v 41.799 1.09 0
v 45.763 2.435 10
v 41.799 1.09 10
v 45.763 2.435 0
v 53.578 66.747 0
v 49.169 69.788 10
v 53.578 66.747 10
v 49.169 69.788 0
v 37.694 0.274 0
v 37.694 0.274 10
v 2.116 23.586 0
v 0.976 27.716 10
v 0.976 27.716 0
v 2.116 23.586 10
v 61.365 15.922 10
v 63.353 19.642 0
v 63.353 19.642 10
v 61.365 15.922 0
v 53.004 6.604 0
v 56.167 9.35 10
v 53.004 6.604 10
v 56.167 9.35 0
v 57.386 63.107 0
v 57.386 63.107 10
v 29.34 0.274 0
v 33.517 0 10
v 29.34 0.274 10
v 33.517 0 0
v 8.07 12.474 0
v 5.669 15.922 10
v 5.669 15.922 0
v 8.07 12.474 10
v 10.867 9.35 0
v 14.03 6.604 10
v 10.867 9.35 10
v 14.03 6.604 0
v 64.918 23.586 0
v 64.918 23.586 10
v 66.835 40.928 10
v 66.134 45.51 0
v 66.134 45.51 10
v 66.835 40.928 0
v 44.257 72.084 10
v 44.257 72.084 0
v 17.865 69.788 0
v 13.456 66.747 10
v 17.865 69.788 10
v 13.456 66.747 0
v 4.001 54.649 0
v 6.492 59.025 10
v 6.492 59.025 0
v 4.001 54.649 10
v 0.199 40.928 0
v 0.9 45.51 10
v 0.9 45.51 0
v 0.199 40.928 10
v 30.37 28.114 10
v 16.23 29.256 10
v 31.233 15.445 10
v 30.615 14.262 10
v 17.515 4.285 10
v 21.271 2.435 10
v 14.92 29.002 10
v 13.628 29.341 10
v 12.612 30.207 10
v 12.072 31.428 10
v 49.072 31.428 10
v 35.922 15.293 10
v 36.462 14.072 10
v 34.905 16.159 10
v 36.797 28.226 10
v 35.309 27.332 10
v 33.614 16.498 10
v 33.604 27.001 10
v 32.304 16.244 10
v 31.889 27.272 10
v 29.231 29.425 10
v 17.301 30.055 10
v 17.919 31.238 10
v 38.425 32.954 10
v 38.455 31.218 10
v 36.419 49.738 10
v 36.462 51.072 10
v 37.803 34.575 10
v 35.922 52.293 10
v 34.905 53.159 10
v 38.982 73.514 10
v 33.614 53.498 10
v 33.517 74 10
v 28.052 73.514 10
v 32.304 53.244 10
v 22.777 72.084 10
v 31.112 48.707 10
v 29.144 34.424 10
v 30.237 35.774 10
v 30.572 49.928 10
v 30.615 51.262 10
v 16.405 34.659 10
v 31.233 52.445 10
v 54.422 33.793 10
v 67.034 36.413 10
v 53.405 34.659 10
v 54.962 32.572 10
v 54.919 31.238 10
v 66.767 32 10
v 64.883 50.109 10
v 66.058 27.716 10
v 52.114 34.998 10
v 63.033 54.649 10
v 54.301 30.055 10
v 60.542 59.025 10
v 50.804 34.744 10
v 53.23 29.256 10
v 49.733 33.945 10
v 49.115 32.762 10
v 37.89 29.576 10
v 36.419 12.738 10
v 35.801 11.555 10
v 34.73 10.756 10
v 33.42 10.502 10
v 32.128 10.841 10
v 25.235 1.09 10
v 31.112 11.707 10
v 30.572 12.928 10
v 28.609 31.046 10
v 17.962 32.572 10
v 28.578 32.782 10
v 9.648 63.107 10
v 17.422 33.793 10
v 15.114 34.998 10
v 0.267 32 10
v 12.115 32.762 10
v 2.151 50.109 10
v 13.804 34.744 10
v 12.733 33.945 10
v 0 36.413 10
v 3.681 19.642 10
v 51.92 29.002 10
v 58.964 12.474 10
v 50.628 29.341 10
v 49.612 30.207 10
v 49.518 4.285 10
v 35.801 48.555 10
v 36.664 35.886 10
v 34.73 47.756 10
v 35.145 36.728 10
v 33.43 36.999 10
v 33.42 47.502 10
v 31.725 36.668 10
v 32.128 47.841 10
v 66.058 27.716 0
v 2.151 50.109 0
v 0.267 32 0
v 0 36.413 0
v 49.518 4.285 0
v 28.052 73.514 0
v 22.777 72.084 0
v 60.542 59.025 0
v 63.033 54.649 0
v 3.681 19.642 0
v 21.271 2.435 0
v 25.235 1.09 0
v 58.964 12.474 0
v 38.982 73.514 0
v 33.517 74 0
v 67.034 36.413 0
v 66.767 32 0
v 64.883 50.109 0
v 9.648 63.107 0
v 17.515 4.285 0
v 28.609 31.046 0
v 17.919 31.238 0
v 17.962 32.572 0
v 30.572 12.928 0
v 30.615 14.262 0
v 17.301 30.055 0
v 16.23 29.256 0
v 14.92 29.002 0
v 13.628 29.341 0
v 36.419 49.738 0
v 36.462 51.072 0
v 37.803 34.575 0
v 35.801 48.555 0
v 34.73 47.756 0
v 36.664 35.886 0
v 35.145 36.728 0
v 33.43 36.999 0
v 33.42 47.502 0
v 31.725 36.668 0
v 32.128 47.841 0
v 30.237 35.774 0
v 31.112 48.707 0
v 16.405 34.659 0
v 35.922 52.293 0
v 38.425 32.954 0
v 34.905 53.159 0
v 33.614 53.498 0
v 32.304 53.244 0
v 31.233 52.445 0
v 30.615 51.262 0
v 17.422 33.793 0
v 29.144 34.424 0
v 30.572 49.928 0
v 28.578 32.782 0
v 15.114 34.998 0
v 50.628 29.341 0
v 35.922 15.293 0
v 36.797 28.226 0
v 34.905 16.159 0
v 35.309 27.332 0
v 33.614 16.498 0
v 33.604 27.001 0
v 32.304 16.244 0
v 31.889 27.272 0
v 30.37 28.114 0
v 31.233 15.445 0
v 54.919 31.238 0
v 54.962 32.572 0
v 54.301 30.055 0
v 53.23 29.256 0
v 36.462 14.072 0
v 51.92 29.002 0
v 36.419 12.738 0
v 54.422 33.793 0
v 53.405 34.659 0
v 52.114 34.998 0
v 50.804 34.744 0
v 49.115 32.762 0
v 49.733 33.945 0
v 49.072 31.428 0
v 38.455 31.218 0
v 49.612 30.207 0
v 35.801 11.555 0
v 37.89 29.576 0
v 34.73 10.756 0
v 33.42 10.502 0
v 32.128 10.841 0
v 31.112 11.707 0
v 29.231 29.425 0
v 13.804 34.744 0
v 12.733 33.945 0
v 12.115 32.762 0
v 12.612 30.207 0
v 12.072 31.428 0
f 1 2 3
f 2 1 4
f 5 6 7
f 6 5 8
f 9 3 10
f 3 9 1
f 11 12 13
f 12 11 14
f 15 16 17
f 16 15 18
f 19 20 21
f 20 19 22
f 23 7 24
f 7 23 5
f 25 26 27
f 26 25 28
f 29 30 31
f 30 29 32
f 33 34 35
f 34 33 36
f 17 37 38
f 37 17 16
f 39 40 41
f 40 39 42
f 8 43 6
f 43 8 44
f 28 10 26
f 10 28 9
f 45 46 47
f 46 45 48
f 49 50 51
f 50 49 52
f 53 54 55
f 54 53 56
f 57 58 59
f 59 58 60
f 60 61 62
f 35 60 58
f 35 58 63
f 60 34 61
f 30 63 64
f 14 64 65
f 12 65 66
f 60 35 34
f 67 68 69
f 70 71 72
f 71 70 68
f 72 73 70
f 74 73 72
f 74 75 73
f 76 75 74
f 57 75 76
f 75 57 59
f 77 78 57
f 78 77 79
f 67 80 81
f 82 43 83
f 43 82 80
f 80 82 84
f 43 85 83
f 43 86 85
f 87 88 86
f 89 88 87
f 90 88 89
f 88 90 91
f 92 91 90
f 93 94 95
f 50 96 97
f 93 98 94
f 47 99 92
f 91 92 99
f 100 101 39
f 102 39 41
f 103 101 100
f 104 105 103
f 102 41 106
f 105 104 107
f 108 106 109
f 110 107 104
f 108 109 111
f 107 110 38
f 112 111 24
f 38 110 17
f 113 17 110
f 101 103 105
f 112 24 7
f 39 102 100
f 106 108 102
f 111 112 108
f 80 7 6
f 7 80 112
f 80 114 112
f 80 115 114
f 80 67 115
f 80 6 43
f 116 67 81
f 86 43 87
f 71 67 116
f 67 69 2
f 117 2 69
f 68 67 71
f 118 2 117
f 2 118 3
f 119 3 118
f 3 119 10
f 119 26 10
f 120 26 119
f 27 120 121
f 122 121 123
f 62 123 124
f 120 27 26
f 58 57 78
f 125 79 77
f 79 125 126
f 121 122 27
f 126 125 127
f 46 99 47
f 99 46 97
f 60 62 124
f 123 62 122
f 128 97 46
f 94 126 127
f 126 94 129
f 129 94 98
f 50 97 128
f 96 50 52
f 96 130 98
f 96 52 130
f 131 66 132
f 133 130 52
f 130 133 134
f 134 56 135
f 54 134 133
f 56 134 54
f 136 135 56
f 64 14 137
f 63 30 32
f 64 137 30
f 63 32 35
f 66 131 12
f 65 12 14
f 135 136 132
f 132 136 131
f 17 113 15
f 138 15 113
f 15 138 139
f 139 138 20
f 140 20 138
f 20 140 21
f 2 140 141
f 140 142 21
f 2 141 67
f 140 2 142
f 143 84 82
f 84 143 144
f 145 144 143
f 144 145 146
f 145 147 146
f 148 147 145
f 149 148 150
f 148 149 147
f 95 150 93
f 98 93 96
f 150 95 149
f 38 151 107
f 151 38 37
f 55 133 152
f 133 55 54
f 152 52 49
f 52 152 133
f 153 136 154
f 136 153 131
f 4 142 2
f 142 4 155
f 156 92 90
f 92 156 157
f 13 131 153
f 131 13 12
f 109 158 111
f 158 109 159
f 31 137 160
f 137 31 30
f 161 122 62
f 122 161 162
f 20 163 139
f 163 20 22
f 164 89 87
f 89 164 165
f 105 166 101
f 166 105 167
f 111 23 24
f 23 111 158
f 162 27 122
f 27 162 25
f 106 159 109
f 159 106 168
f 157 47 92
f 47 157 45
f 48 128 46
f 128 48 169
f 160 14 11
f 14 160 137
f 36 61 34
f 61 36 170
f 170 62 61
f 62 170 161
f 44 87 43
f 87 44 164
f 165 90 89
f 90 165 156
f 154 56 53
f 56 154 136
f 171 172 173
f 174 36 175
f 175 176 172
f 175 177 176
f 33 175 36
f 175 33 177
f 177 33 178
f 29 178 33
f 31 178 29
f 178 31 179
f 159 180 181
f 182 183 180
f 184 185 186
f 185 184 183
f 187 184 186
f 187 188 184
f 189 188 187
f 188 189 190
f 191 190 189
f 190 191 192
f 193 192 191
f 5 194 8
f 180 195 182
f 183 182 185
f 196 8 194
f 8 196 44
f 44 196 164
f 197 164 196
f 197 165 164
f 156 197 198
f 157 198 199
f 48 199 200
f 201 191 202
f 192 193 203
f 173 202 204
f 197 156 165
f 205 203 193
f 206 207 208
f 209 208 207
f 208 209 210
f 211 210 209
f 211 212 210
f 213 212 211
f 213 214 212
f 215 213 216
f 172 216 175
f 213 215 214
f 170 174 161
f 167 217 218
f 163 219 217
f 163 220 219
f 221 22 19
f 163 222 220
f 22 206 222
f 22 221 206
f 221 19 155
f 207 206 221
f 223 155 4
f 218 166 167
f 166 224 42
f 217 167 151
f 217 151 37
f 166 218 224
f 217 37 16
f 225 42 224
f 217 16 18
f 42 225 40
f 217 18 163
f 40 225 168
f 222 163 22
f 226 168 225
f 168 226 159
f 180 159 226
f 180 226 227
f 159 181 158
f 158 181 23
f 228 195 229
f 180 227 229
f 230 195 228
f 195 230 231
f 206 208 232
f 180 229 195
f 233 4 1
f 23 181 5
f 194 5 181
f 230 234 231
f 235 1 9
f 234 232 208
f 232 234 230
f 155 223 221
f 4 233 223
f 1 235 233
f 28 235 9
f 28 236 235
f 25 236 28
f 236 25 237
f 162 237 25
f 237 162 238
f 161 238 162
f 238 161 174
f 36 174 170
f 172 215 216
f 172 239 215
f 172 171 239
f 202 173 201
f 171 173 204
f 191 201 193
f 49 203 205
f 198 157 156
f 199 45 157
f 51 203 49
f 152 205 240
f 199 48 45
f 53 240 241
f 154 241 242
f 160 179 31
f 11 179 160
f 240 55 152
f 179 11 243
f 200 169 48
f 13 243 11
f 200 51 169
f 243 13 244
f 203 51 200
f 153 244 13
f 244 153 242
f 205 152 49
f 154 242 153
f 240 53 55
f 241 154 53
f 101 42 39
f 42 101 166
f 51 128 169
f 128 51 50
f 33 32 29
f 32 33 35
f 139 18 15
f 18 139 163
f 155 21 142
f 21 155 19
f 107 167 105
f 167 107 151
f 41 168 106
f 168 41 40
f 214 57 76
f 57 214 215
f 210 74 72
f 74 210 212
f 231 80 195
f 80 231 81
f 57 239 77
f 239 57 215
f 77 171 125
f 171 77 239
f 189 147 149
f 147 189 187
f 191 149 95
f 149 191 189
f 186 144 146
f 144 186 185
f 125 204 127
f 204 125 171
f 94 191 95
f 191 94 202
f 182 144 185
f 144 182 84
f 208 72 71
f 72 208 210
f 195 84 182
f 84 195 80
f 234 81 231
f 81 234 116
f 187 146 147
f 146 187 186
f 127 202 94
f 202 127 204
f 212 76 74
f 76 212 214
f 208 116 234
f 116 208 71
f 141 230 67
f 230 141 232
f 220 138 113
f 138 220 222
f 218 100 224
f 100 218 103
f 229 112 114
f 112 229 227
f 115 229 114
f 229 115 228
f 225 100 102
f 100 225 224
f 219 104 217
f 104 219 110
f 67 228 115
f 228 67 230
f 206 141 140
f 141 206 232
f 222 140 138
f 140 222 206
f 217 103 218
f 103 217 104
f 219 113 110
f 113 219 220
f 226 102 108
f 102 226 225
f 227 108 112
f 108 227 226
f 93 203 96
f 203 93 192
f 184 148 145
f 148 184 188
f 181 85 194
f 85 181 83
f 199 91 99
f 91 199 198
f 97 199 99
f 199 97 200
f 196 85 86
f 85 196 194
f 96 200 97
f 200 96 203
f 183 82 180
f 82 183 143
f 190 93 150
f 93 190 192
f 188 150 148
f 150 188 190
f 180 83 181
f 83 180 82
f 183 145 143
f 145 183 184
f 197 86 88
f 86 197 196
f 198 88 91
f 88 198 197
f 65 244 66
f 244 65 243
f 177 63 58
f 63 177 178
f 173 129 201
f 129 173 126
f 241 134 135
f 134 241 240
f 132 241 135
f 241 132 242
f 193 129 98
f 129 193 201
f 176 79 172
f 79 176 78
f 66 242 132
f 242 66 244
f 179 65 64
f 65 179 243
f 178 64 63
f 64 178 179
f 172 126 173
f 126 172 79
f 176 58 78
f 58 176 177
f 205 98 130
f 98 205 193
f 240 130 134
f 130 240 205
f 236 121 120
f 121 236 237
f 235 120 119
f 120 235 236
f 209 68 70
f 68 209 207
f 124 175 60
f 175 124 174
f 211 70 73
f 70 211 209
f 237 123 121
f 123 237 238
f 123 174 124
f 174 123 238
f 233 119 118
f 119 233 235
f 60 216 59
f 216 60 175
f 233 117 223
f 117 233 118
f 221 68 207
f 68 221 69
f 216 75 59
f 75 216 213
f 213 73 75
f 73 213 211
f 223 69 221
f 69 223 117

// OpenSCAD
$fn = 32;

// ----------------------------------------------------------------------
// Cam plate: single_lobe cam, base R32
// ----------------------------------------------------------------------

// --- parameters (mm) ---
base_r = 32;              // base circle radius
lobe_h = 10;              // cam lobe rise
bore_r = 5;               // shaft bore radius
plate_t = 10;             // plate thickness, Z (extrusion height)
ring_r = 18.5;            // lightening ring radius
bolt_r = 3;               // lightening hole radius
fit_tol = 0.1;            // declared fit tolerance (prompt contract)
free_tol = 0.5;           // declared free tolerance (prompt contract)

profile = [[66.767, 32], [67.034, 36.413], [66.835, 40.928], [66.134, 45.51], [64.883, 50.109], [63.033, 54.649], [60.542, 59.025], [57.386, 63.107], [53.578, 66.747], [49.169, 69.788], [44.257, 72.084], [38.982, 73.514], [33.517, 74], [28.052, 73.514], [22.777, 72.084], [17.865, 69.788], [13.456, 66.747], [9.648, 63.107], [6.492, 59.025], [4.001, 54.649], [2.151, 50.109], [0.9, 45.51], [0.199, 40.928], [0, 36.413], [0.267, 32], [0.976, 27.716], [2.116, 23.586], [3.681, 19.642], [5.669, 15.922], [8.07, 12.474], [10.867, 9.35], [14.03, 6.604], [17.515, 4.285], [21.271, 2.435], [25.235, 1.09], [29.34, 0.274], [33.517, 0], [37.694, 0.274], [41.799, 1.09], [45.763, 2.435], [49.518, 4.285], [53.004, 6.604], [56.167, 9.35], [58.964, 12.474], [61.365, 15.922], [63.353, 19.642], [64.918, 23.586], [66.058, 27.716]];  // primary outline, 48 points, counter clockwise
void_1 = [[38.425, 32.954], [37.803, 34.575], [36.664, 35.886], [35.145, 36.728], [33.43, 36.999], [31.725, 36.668], [30.237, 35.774], [29.144, 34.424], [28.578, 32.782], [28.609, 31.046], [29.231, 29.425], [30.37, 28.114], [31.889, 27.272], [33.604, 27.001], [35.309, 27.332], [36.797, 28.226], [37.89, 29.576], [38.455, 31.218]];  // shaft bore, 18 points
void_2 = [[54.962, 32.572], [54.422, 33.793], [53.405, 34.659], [52.114, 34.998], [50.804, 34.744], [49.733, 33.945], [49.115, 32.762], [49.072, 31.428], [49.612, 30.207], [50.628, 29.341], [51.92, 29.002], [53.23, 29.256], [54.301, 30.055], [54.919, 31.238]];  // lightening hole 1, 14 points
void_3 = [[36.462, 51.072], [35.922, 52.293], [34.905, 53.159], [33.614, 53.498], [32.304, 53.244], [31.233, 52.445], [30.615, 51.262], [30.572, 49.928], [31.112, 48.707], [32.128, 47.841], [33.42, 47.502], [34.73, 47.756], [35.801, 48.555], [36.419, 49.738]];  // lightening hole 2, 14 points
void_4 = [[17.962, 32.572], [17.422, 33.793], [16.405, 34.659], [15.114, 34.998], [13.804, 34.744], [12.733, 33.945], [12.115, 32.762], [12.072, 31.428], [12.612, 30.207], [13.628, 29.341], [14.92, 29.002], [16.23, 29.256], [17.301, 30.055], [17.919, 31.238]];  // lightening hole 3, 14 points
void_5 = [[36.462, 14.072], [35.922, 15.293], [34.905, 16.159], [33.614, 16.498], [32.304, 16.244], [31.233, 15.445], [30.615, 14.262], [30.572, 12.928], [31.112, 11.707], [32.128, 10.841], [33.42, 10.502], [34.73, 10.756], [35.801, 11.555], [36.419, 12.738]];  // lightening hole 4, 14 points

// --- the one profile operation ---
difference() {
  linear_extrude(height = plate_t) polygon(points = profile);
  translate([0, 0, -1])
    linear_extrude(height = plate_t + 2) polygon(points = void_1);
  translate([0, 0, -1])
    linear_extrude(height = plate_t + 2) polygon(points = void_2);
  translate([0, 0, -1])
    linear_extrude(height = plate_t + 2) polygon(points = void_3);
  translate([0, 0, -1])
    linear_extrude(height = plate_t + 2) polygon(points = void_4);
  translate([0, 0, -1])
    linear_extrude(height = plate_t + 2) polygon(points = void_5);
}
